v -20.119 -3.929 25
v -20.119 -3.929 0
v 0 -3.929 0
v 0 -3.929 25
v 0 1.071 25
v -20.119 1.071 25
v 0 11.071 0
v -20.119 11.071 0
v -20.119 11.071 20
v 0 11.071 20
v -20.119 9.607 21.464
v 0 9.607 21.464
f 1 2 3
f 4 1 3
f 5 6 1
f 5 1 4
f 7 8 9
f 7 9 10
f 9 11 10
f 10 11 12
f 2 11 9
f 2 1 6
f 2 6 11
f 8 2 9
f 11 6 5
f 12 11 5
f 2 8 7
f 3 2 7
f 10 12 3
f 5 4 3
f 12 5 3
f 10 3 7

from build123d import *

# Parameters (mm, degrees)
F0_W     = 20.1190489383
F0_H     = 15
F1_DEPTH = 25
F2_SIZE  = 5
F3_SIZE  = 5


with BuildPart() as f1:
    # F0 (on Top) → F1 (new body)
    with BuildSketch(Plane.XY):
        with Locations((-10.0595244691, 3.5714283609)):
            Rectangle(F0_W, F0_H)
    extrude(amount=F1_DEPTH)

    # F2
    f2_edges = [f1.edges().sort_by_distance(p)[0] for p in [
        (-10.059524, 11.071428, 25),
    ]]
    chamfer(f2_edges, length=F2_SIZE)

    # F3
    f3_edges = [f1.edges().sort_by_distance(p)[0] for p in [
        (-10.059524, 6.071428, 25),
    ]]
    chamfer(f3_edges, length=F3_SIZE)


solid = f1.part
